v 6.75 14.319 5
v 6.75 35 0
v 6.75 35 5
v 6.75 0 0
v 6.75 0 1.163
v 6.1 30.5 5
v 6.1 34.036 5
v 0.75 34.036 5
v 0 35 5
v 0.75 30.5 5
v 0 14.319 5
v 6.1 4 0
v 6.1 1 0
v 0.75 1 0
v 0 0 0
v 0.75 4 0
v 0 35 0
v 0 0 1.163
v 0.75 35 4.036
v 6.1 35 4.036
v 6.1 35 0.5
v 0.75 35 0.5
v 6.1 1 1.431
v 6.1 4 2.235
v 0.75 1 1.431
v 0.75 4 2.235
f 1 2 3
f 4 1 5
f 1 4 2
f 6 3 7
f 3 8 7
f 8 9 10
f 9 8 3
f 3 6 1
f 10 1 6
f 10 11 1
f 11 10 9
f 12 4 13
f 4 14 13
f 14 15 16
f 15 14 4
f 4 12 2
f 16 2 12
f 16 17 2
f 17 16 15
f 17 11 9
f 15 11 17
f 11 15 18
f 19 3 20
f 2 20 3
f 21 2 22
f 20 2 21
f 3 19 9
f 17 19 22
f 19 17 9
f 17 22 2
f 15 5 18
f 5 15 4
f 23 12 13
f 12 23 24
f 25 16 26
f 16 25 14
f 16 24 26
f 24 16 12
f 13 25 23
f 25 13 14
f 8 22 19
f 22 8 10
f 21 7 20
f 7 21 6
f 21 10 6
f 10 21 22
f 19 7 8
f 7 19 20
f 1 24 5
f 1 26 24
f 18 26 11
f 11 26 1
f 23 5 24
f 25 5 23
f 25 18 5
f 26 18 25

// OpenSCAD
// Cover weight

tape_width_mm = 8;
weight_width_mm = tape_width_mm - 1.25;
weight_lenght_mm = 35;
weight_height_mm = 5;

cover_width_mm = weight_width_mm -1.4;

difference() {
    // Weight
    cube([weight_width_mm, weight_lenght_mm , weight_height_mm]);

    // Cover hole (front)
    translate([0.75, 1, -1])
        cube([cover_width_mm, 3, 7]);

    // Cover hole (rear)
    translate([0.75, weight_lenght_mm, 0.5])
        rotate([45, 0, 0])
            cube([cover_width_mm, 2.5, 8]);

    // wedge
    translate([-1, -5, 5])
        rotate([-75, 0, 0])
            cube ([tape_width_mm, 5, 5* weight_height_mm]);

}
